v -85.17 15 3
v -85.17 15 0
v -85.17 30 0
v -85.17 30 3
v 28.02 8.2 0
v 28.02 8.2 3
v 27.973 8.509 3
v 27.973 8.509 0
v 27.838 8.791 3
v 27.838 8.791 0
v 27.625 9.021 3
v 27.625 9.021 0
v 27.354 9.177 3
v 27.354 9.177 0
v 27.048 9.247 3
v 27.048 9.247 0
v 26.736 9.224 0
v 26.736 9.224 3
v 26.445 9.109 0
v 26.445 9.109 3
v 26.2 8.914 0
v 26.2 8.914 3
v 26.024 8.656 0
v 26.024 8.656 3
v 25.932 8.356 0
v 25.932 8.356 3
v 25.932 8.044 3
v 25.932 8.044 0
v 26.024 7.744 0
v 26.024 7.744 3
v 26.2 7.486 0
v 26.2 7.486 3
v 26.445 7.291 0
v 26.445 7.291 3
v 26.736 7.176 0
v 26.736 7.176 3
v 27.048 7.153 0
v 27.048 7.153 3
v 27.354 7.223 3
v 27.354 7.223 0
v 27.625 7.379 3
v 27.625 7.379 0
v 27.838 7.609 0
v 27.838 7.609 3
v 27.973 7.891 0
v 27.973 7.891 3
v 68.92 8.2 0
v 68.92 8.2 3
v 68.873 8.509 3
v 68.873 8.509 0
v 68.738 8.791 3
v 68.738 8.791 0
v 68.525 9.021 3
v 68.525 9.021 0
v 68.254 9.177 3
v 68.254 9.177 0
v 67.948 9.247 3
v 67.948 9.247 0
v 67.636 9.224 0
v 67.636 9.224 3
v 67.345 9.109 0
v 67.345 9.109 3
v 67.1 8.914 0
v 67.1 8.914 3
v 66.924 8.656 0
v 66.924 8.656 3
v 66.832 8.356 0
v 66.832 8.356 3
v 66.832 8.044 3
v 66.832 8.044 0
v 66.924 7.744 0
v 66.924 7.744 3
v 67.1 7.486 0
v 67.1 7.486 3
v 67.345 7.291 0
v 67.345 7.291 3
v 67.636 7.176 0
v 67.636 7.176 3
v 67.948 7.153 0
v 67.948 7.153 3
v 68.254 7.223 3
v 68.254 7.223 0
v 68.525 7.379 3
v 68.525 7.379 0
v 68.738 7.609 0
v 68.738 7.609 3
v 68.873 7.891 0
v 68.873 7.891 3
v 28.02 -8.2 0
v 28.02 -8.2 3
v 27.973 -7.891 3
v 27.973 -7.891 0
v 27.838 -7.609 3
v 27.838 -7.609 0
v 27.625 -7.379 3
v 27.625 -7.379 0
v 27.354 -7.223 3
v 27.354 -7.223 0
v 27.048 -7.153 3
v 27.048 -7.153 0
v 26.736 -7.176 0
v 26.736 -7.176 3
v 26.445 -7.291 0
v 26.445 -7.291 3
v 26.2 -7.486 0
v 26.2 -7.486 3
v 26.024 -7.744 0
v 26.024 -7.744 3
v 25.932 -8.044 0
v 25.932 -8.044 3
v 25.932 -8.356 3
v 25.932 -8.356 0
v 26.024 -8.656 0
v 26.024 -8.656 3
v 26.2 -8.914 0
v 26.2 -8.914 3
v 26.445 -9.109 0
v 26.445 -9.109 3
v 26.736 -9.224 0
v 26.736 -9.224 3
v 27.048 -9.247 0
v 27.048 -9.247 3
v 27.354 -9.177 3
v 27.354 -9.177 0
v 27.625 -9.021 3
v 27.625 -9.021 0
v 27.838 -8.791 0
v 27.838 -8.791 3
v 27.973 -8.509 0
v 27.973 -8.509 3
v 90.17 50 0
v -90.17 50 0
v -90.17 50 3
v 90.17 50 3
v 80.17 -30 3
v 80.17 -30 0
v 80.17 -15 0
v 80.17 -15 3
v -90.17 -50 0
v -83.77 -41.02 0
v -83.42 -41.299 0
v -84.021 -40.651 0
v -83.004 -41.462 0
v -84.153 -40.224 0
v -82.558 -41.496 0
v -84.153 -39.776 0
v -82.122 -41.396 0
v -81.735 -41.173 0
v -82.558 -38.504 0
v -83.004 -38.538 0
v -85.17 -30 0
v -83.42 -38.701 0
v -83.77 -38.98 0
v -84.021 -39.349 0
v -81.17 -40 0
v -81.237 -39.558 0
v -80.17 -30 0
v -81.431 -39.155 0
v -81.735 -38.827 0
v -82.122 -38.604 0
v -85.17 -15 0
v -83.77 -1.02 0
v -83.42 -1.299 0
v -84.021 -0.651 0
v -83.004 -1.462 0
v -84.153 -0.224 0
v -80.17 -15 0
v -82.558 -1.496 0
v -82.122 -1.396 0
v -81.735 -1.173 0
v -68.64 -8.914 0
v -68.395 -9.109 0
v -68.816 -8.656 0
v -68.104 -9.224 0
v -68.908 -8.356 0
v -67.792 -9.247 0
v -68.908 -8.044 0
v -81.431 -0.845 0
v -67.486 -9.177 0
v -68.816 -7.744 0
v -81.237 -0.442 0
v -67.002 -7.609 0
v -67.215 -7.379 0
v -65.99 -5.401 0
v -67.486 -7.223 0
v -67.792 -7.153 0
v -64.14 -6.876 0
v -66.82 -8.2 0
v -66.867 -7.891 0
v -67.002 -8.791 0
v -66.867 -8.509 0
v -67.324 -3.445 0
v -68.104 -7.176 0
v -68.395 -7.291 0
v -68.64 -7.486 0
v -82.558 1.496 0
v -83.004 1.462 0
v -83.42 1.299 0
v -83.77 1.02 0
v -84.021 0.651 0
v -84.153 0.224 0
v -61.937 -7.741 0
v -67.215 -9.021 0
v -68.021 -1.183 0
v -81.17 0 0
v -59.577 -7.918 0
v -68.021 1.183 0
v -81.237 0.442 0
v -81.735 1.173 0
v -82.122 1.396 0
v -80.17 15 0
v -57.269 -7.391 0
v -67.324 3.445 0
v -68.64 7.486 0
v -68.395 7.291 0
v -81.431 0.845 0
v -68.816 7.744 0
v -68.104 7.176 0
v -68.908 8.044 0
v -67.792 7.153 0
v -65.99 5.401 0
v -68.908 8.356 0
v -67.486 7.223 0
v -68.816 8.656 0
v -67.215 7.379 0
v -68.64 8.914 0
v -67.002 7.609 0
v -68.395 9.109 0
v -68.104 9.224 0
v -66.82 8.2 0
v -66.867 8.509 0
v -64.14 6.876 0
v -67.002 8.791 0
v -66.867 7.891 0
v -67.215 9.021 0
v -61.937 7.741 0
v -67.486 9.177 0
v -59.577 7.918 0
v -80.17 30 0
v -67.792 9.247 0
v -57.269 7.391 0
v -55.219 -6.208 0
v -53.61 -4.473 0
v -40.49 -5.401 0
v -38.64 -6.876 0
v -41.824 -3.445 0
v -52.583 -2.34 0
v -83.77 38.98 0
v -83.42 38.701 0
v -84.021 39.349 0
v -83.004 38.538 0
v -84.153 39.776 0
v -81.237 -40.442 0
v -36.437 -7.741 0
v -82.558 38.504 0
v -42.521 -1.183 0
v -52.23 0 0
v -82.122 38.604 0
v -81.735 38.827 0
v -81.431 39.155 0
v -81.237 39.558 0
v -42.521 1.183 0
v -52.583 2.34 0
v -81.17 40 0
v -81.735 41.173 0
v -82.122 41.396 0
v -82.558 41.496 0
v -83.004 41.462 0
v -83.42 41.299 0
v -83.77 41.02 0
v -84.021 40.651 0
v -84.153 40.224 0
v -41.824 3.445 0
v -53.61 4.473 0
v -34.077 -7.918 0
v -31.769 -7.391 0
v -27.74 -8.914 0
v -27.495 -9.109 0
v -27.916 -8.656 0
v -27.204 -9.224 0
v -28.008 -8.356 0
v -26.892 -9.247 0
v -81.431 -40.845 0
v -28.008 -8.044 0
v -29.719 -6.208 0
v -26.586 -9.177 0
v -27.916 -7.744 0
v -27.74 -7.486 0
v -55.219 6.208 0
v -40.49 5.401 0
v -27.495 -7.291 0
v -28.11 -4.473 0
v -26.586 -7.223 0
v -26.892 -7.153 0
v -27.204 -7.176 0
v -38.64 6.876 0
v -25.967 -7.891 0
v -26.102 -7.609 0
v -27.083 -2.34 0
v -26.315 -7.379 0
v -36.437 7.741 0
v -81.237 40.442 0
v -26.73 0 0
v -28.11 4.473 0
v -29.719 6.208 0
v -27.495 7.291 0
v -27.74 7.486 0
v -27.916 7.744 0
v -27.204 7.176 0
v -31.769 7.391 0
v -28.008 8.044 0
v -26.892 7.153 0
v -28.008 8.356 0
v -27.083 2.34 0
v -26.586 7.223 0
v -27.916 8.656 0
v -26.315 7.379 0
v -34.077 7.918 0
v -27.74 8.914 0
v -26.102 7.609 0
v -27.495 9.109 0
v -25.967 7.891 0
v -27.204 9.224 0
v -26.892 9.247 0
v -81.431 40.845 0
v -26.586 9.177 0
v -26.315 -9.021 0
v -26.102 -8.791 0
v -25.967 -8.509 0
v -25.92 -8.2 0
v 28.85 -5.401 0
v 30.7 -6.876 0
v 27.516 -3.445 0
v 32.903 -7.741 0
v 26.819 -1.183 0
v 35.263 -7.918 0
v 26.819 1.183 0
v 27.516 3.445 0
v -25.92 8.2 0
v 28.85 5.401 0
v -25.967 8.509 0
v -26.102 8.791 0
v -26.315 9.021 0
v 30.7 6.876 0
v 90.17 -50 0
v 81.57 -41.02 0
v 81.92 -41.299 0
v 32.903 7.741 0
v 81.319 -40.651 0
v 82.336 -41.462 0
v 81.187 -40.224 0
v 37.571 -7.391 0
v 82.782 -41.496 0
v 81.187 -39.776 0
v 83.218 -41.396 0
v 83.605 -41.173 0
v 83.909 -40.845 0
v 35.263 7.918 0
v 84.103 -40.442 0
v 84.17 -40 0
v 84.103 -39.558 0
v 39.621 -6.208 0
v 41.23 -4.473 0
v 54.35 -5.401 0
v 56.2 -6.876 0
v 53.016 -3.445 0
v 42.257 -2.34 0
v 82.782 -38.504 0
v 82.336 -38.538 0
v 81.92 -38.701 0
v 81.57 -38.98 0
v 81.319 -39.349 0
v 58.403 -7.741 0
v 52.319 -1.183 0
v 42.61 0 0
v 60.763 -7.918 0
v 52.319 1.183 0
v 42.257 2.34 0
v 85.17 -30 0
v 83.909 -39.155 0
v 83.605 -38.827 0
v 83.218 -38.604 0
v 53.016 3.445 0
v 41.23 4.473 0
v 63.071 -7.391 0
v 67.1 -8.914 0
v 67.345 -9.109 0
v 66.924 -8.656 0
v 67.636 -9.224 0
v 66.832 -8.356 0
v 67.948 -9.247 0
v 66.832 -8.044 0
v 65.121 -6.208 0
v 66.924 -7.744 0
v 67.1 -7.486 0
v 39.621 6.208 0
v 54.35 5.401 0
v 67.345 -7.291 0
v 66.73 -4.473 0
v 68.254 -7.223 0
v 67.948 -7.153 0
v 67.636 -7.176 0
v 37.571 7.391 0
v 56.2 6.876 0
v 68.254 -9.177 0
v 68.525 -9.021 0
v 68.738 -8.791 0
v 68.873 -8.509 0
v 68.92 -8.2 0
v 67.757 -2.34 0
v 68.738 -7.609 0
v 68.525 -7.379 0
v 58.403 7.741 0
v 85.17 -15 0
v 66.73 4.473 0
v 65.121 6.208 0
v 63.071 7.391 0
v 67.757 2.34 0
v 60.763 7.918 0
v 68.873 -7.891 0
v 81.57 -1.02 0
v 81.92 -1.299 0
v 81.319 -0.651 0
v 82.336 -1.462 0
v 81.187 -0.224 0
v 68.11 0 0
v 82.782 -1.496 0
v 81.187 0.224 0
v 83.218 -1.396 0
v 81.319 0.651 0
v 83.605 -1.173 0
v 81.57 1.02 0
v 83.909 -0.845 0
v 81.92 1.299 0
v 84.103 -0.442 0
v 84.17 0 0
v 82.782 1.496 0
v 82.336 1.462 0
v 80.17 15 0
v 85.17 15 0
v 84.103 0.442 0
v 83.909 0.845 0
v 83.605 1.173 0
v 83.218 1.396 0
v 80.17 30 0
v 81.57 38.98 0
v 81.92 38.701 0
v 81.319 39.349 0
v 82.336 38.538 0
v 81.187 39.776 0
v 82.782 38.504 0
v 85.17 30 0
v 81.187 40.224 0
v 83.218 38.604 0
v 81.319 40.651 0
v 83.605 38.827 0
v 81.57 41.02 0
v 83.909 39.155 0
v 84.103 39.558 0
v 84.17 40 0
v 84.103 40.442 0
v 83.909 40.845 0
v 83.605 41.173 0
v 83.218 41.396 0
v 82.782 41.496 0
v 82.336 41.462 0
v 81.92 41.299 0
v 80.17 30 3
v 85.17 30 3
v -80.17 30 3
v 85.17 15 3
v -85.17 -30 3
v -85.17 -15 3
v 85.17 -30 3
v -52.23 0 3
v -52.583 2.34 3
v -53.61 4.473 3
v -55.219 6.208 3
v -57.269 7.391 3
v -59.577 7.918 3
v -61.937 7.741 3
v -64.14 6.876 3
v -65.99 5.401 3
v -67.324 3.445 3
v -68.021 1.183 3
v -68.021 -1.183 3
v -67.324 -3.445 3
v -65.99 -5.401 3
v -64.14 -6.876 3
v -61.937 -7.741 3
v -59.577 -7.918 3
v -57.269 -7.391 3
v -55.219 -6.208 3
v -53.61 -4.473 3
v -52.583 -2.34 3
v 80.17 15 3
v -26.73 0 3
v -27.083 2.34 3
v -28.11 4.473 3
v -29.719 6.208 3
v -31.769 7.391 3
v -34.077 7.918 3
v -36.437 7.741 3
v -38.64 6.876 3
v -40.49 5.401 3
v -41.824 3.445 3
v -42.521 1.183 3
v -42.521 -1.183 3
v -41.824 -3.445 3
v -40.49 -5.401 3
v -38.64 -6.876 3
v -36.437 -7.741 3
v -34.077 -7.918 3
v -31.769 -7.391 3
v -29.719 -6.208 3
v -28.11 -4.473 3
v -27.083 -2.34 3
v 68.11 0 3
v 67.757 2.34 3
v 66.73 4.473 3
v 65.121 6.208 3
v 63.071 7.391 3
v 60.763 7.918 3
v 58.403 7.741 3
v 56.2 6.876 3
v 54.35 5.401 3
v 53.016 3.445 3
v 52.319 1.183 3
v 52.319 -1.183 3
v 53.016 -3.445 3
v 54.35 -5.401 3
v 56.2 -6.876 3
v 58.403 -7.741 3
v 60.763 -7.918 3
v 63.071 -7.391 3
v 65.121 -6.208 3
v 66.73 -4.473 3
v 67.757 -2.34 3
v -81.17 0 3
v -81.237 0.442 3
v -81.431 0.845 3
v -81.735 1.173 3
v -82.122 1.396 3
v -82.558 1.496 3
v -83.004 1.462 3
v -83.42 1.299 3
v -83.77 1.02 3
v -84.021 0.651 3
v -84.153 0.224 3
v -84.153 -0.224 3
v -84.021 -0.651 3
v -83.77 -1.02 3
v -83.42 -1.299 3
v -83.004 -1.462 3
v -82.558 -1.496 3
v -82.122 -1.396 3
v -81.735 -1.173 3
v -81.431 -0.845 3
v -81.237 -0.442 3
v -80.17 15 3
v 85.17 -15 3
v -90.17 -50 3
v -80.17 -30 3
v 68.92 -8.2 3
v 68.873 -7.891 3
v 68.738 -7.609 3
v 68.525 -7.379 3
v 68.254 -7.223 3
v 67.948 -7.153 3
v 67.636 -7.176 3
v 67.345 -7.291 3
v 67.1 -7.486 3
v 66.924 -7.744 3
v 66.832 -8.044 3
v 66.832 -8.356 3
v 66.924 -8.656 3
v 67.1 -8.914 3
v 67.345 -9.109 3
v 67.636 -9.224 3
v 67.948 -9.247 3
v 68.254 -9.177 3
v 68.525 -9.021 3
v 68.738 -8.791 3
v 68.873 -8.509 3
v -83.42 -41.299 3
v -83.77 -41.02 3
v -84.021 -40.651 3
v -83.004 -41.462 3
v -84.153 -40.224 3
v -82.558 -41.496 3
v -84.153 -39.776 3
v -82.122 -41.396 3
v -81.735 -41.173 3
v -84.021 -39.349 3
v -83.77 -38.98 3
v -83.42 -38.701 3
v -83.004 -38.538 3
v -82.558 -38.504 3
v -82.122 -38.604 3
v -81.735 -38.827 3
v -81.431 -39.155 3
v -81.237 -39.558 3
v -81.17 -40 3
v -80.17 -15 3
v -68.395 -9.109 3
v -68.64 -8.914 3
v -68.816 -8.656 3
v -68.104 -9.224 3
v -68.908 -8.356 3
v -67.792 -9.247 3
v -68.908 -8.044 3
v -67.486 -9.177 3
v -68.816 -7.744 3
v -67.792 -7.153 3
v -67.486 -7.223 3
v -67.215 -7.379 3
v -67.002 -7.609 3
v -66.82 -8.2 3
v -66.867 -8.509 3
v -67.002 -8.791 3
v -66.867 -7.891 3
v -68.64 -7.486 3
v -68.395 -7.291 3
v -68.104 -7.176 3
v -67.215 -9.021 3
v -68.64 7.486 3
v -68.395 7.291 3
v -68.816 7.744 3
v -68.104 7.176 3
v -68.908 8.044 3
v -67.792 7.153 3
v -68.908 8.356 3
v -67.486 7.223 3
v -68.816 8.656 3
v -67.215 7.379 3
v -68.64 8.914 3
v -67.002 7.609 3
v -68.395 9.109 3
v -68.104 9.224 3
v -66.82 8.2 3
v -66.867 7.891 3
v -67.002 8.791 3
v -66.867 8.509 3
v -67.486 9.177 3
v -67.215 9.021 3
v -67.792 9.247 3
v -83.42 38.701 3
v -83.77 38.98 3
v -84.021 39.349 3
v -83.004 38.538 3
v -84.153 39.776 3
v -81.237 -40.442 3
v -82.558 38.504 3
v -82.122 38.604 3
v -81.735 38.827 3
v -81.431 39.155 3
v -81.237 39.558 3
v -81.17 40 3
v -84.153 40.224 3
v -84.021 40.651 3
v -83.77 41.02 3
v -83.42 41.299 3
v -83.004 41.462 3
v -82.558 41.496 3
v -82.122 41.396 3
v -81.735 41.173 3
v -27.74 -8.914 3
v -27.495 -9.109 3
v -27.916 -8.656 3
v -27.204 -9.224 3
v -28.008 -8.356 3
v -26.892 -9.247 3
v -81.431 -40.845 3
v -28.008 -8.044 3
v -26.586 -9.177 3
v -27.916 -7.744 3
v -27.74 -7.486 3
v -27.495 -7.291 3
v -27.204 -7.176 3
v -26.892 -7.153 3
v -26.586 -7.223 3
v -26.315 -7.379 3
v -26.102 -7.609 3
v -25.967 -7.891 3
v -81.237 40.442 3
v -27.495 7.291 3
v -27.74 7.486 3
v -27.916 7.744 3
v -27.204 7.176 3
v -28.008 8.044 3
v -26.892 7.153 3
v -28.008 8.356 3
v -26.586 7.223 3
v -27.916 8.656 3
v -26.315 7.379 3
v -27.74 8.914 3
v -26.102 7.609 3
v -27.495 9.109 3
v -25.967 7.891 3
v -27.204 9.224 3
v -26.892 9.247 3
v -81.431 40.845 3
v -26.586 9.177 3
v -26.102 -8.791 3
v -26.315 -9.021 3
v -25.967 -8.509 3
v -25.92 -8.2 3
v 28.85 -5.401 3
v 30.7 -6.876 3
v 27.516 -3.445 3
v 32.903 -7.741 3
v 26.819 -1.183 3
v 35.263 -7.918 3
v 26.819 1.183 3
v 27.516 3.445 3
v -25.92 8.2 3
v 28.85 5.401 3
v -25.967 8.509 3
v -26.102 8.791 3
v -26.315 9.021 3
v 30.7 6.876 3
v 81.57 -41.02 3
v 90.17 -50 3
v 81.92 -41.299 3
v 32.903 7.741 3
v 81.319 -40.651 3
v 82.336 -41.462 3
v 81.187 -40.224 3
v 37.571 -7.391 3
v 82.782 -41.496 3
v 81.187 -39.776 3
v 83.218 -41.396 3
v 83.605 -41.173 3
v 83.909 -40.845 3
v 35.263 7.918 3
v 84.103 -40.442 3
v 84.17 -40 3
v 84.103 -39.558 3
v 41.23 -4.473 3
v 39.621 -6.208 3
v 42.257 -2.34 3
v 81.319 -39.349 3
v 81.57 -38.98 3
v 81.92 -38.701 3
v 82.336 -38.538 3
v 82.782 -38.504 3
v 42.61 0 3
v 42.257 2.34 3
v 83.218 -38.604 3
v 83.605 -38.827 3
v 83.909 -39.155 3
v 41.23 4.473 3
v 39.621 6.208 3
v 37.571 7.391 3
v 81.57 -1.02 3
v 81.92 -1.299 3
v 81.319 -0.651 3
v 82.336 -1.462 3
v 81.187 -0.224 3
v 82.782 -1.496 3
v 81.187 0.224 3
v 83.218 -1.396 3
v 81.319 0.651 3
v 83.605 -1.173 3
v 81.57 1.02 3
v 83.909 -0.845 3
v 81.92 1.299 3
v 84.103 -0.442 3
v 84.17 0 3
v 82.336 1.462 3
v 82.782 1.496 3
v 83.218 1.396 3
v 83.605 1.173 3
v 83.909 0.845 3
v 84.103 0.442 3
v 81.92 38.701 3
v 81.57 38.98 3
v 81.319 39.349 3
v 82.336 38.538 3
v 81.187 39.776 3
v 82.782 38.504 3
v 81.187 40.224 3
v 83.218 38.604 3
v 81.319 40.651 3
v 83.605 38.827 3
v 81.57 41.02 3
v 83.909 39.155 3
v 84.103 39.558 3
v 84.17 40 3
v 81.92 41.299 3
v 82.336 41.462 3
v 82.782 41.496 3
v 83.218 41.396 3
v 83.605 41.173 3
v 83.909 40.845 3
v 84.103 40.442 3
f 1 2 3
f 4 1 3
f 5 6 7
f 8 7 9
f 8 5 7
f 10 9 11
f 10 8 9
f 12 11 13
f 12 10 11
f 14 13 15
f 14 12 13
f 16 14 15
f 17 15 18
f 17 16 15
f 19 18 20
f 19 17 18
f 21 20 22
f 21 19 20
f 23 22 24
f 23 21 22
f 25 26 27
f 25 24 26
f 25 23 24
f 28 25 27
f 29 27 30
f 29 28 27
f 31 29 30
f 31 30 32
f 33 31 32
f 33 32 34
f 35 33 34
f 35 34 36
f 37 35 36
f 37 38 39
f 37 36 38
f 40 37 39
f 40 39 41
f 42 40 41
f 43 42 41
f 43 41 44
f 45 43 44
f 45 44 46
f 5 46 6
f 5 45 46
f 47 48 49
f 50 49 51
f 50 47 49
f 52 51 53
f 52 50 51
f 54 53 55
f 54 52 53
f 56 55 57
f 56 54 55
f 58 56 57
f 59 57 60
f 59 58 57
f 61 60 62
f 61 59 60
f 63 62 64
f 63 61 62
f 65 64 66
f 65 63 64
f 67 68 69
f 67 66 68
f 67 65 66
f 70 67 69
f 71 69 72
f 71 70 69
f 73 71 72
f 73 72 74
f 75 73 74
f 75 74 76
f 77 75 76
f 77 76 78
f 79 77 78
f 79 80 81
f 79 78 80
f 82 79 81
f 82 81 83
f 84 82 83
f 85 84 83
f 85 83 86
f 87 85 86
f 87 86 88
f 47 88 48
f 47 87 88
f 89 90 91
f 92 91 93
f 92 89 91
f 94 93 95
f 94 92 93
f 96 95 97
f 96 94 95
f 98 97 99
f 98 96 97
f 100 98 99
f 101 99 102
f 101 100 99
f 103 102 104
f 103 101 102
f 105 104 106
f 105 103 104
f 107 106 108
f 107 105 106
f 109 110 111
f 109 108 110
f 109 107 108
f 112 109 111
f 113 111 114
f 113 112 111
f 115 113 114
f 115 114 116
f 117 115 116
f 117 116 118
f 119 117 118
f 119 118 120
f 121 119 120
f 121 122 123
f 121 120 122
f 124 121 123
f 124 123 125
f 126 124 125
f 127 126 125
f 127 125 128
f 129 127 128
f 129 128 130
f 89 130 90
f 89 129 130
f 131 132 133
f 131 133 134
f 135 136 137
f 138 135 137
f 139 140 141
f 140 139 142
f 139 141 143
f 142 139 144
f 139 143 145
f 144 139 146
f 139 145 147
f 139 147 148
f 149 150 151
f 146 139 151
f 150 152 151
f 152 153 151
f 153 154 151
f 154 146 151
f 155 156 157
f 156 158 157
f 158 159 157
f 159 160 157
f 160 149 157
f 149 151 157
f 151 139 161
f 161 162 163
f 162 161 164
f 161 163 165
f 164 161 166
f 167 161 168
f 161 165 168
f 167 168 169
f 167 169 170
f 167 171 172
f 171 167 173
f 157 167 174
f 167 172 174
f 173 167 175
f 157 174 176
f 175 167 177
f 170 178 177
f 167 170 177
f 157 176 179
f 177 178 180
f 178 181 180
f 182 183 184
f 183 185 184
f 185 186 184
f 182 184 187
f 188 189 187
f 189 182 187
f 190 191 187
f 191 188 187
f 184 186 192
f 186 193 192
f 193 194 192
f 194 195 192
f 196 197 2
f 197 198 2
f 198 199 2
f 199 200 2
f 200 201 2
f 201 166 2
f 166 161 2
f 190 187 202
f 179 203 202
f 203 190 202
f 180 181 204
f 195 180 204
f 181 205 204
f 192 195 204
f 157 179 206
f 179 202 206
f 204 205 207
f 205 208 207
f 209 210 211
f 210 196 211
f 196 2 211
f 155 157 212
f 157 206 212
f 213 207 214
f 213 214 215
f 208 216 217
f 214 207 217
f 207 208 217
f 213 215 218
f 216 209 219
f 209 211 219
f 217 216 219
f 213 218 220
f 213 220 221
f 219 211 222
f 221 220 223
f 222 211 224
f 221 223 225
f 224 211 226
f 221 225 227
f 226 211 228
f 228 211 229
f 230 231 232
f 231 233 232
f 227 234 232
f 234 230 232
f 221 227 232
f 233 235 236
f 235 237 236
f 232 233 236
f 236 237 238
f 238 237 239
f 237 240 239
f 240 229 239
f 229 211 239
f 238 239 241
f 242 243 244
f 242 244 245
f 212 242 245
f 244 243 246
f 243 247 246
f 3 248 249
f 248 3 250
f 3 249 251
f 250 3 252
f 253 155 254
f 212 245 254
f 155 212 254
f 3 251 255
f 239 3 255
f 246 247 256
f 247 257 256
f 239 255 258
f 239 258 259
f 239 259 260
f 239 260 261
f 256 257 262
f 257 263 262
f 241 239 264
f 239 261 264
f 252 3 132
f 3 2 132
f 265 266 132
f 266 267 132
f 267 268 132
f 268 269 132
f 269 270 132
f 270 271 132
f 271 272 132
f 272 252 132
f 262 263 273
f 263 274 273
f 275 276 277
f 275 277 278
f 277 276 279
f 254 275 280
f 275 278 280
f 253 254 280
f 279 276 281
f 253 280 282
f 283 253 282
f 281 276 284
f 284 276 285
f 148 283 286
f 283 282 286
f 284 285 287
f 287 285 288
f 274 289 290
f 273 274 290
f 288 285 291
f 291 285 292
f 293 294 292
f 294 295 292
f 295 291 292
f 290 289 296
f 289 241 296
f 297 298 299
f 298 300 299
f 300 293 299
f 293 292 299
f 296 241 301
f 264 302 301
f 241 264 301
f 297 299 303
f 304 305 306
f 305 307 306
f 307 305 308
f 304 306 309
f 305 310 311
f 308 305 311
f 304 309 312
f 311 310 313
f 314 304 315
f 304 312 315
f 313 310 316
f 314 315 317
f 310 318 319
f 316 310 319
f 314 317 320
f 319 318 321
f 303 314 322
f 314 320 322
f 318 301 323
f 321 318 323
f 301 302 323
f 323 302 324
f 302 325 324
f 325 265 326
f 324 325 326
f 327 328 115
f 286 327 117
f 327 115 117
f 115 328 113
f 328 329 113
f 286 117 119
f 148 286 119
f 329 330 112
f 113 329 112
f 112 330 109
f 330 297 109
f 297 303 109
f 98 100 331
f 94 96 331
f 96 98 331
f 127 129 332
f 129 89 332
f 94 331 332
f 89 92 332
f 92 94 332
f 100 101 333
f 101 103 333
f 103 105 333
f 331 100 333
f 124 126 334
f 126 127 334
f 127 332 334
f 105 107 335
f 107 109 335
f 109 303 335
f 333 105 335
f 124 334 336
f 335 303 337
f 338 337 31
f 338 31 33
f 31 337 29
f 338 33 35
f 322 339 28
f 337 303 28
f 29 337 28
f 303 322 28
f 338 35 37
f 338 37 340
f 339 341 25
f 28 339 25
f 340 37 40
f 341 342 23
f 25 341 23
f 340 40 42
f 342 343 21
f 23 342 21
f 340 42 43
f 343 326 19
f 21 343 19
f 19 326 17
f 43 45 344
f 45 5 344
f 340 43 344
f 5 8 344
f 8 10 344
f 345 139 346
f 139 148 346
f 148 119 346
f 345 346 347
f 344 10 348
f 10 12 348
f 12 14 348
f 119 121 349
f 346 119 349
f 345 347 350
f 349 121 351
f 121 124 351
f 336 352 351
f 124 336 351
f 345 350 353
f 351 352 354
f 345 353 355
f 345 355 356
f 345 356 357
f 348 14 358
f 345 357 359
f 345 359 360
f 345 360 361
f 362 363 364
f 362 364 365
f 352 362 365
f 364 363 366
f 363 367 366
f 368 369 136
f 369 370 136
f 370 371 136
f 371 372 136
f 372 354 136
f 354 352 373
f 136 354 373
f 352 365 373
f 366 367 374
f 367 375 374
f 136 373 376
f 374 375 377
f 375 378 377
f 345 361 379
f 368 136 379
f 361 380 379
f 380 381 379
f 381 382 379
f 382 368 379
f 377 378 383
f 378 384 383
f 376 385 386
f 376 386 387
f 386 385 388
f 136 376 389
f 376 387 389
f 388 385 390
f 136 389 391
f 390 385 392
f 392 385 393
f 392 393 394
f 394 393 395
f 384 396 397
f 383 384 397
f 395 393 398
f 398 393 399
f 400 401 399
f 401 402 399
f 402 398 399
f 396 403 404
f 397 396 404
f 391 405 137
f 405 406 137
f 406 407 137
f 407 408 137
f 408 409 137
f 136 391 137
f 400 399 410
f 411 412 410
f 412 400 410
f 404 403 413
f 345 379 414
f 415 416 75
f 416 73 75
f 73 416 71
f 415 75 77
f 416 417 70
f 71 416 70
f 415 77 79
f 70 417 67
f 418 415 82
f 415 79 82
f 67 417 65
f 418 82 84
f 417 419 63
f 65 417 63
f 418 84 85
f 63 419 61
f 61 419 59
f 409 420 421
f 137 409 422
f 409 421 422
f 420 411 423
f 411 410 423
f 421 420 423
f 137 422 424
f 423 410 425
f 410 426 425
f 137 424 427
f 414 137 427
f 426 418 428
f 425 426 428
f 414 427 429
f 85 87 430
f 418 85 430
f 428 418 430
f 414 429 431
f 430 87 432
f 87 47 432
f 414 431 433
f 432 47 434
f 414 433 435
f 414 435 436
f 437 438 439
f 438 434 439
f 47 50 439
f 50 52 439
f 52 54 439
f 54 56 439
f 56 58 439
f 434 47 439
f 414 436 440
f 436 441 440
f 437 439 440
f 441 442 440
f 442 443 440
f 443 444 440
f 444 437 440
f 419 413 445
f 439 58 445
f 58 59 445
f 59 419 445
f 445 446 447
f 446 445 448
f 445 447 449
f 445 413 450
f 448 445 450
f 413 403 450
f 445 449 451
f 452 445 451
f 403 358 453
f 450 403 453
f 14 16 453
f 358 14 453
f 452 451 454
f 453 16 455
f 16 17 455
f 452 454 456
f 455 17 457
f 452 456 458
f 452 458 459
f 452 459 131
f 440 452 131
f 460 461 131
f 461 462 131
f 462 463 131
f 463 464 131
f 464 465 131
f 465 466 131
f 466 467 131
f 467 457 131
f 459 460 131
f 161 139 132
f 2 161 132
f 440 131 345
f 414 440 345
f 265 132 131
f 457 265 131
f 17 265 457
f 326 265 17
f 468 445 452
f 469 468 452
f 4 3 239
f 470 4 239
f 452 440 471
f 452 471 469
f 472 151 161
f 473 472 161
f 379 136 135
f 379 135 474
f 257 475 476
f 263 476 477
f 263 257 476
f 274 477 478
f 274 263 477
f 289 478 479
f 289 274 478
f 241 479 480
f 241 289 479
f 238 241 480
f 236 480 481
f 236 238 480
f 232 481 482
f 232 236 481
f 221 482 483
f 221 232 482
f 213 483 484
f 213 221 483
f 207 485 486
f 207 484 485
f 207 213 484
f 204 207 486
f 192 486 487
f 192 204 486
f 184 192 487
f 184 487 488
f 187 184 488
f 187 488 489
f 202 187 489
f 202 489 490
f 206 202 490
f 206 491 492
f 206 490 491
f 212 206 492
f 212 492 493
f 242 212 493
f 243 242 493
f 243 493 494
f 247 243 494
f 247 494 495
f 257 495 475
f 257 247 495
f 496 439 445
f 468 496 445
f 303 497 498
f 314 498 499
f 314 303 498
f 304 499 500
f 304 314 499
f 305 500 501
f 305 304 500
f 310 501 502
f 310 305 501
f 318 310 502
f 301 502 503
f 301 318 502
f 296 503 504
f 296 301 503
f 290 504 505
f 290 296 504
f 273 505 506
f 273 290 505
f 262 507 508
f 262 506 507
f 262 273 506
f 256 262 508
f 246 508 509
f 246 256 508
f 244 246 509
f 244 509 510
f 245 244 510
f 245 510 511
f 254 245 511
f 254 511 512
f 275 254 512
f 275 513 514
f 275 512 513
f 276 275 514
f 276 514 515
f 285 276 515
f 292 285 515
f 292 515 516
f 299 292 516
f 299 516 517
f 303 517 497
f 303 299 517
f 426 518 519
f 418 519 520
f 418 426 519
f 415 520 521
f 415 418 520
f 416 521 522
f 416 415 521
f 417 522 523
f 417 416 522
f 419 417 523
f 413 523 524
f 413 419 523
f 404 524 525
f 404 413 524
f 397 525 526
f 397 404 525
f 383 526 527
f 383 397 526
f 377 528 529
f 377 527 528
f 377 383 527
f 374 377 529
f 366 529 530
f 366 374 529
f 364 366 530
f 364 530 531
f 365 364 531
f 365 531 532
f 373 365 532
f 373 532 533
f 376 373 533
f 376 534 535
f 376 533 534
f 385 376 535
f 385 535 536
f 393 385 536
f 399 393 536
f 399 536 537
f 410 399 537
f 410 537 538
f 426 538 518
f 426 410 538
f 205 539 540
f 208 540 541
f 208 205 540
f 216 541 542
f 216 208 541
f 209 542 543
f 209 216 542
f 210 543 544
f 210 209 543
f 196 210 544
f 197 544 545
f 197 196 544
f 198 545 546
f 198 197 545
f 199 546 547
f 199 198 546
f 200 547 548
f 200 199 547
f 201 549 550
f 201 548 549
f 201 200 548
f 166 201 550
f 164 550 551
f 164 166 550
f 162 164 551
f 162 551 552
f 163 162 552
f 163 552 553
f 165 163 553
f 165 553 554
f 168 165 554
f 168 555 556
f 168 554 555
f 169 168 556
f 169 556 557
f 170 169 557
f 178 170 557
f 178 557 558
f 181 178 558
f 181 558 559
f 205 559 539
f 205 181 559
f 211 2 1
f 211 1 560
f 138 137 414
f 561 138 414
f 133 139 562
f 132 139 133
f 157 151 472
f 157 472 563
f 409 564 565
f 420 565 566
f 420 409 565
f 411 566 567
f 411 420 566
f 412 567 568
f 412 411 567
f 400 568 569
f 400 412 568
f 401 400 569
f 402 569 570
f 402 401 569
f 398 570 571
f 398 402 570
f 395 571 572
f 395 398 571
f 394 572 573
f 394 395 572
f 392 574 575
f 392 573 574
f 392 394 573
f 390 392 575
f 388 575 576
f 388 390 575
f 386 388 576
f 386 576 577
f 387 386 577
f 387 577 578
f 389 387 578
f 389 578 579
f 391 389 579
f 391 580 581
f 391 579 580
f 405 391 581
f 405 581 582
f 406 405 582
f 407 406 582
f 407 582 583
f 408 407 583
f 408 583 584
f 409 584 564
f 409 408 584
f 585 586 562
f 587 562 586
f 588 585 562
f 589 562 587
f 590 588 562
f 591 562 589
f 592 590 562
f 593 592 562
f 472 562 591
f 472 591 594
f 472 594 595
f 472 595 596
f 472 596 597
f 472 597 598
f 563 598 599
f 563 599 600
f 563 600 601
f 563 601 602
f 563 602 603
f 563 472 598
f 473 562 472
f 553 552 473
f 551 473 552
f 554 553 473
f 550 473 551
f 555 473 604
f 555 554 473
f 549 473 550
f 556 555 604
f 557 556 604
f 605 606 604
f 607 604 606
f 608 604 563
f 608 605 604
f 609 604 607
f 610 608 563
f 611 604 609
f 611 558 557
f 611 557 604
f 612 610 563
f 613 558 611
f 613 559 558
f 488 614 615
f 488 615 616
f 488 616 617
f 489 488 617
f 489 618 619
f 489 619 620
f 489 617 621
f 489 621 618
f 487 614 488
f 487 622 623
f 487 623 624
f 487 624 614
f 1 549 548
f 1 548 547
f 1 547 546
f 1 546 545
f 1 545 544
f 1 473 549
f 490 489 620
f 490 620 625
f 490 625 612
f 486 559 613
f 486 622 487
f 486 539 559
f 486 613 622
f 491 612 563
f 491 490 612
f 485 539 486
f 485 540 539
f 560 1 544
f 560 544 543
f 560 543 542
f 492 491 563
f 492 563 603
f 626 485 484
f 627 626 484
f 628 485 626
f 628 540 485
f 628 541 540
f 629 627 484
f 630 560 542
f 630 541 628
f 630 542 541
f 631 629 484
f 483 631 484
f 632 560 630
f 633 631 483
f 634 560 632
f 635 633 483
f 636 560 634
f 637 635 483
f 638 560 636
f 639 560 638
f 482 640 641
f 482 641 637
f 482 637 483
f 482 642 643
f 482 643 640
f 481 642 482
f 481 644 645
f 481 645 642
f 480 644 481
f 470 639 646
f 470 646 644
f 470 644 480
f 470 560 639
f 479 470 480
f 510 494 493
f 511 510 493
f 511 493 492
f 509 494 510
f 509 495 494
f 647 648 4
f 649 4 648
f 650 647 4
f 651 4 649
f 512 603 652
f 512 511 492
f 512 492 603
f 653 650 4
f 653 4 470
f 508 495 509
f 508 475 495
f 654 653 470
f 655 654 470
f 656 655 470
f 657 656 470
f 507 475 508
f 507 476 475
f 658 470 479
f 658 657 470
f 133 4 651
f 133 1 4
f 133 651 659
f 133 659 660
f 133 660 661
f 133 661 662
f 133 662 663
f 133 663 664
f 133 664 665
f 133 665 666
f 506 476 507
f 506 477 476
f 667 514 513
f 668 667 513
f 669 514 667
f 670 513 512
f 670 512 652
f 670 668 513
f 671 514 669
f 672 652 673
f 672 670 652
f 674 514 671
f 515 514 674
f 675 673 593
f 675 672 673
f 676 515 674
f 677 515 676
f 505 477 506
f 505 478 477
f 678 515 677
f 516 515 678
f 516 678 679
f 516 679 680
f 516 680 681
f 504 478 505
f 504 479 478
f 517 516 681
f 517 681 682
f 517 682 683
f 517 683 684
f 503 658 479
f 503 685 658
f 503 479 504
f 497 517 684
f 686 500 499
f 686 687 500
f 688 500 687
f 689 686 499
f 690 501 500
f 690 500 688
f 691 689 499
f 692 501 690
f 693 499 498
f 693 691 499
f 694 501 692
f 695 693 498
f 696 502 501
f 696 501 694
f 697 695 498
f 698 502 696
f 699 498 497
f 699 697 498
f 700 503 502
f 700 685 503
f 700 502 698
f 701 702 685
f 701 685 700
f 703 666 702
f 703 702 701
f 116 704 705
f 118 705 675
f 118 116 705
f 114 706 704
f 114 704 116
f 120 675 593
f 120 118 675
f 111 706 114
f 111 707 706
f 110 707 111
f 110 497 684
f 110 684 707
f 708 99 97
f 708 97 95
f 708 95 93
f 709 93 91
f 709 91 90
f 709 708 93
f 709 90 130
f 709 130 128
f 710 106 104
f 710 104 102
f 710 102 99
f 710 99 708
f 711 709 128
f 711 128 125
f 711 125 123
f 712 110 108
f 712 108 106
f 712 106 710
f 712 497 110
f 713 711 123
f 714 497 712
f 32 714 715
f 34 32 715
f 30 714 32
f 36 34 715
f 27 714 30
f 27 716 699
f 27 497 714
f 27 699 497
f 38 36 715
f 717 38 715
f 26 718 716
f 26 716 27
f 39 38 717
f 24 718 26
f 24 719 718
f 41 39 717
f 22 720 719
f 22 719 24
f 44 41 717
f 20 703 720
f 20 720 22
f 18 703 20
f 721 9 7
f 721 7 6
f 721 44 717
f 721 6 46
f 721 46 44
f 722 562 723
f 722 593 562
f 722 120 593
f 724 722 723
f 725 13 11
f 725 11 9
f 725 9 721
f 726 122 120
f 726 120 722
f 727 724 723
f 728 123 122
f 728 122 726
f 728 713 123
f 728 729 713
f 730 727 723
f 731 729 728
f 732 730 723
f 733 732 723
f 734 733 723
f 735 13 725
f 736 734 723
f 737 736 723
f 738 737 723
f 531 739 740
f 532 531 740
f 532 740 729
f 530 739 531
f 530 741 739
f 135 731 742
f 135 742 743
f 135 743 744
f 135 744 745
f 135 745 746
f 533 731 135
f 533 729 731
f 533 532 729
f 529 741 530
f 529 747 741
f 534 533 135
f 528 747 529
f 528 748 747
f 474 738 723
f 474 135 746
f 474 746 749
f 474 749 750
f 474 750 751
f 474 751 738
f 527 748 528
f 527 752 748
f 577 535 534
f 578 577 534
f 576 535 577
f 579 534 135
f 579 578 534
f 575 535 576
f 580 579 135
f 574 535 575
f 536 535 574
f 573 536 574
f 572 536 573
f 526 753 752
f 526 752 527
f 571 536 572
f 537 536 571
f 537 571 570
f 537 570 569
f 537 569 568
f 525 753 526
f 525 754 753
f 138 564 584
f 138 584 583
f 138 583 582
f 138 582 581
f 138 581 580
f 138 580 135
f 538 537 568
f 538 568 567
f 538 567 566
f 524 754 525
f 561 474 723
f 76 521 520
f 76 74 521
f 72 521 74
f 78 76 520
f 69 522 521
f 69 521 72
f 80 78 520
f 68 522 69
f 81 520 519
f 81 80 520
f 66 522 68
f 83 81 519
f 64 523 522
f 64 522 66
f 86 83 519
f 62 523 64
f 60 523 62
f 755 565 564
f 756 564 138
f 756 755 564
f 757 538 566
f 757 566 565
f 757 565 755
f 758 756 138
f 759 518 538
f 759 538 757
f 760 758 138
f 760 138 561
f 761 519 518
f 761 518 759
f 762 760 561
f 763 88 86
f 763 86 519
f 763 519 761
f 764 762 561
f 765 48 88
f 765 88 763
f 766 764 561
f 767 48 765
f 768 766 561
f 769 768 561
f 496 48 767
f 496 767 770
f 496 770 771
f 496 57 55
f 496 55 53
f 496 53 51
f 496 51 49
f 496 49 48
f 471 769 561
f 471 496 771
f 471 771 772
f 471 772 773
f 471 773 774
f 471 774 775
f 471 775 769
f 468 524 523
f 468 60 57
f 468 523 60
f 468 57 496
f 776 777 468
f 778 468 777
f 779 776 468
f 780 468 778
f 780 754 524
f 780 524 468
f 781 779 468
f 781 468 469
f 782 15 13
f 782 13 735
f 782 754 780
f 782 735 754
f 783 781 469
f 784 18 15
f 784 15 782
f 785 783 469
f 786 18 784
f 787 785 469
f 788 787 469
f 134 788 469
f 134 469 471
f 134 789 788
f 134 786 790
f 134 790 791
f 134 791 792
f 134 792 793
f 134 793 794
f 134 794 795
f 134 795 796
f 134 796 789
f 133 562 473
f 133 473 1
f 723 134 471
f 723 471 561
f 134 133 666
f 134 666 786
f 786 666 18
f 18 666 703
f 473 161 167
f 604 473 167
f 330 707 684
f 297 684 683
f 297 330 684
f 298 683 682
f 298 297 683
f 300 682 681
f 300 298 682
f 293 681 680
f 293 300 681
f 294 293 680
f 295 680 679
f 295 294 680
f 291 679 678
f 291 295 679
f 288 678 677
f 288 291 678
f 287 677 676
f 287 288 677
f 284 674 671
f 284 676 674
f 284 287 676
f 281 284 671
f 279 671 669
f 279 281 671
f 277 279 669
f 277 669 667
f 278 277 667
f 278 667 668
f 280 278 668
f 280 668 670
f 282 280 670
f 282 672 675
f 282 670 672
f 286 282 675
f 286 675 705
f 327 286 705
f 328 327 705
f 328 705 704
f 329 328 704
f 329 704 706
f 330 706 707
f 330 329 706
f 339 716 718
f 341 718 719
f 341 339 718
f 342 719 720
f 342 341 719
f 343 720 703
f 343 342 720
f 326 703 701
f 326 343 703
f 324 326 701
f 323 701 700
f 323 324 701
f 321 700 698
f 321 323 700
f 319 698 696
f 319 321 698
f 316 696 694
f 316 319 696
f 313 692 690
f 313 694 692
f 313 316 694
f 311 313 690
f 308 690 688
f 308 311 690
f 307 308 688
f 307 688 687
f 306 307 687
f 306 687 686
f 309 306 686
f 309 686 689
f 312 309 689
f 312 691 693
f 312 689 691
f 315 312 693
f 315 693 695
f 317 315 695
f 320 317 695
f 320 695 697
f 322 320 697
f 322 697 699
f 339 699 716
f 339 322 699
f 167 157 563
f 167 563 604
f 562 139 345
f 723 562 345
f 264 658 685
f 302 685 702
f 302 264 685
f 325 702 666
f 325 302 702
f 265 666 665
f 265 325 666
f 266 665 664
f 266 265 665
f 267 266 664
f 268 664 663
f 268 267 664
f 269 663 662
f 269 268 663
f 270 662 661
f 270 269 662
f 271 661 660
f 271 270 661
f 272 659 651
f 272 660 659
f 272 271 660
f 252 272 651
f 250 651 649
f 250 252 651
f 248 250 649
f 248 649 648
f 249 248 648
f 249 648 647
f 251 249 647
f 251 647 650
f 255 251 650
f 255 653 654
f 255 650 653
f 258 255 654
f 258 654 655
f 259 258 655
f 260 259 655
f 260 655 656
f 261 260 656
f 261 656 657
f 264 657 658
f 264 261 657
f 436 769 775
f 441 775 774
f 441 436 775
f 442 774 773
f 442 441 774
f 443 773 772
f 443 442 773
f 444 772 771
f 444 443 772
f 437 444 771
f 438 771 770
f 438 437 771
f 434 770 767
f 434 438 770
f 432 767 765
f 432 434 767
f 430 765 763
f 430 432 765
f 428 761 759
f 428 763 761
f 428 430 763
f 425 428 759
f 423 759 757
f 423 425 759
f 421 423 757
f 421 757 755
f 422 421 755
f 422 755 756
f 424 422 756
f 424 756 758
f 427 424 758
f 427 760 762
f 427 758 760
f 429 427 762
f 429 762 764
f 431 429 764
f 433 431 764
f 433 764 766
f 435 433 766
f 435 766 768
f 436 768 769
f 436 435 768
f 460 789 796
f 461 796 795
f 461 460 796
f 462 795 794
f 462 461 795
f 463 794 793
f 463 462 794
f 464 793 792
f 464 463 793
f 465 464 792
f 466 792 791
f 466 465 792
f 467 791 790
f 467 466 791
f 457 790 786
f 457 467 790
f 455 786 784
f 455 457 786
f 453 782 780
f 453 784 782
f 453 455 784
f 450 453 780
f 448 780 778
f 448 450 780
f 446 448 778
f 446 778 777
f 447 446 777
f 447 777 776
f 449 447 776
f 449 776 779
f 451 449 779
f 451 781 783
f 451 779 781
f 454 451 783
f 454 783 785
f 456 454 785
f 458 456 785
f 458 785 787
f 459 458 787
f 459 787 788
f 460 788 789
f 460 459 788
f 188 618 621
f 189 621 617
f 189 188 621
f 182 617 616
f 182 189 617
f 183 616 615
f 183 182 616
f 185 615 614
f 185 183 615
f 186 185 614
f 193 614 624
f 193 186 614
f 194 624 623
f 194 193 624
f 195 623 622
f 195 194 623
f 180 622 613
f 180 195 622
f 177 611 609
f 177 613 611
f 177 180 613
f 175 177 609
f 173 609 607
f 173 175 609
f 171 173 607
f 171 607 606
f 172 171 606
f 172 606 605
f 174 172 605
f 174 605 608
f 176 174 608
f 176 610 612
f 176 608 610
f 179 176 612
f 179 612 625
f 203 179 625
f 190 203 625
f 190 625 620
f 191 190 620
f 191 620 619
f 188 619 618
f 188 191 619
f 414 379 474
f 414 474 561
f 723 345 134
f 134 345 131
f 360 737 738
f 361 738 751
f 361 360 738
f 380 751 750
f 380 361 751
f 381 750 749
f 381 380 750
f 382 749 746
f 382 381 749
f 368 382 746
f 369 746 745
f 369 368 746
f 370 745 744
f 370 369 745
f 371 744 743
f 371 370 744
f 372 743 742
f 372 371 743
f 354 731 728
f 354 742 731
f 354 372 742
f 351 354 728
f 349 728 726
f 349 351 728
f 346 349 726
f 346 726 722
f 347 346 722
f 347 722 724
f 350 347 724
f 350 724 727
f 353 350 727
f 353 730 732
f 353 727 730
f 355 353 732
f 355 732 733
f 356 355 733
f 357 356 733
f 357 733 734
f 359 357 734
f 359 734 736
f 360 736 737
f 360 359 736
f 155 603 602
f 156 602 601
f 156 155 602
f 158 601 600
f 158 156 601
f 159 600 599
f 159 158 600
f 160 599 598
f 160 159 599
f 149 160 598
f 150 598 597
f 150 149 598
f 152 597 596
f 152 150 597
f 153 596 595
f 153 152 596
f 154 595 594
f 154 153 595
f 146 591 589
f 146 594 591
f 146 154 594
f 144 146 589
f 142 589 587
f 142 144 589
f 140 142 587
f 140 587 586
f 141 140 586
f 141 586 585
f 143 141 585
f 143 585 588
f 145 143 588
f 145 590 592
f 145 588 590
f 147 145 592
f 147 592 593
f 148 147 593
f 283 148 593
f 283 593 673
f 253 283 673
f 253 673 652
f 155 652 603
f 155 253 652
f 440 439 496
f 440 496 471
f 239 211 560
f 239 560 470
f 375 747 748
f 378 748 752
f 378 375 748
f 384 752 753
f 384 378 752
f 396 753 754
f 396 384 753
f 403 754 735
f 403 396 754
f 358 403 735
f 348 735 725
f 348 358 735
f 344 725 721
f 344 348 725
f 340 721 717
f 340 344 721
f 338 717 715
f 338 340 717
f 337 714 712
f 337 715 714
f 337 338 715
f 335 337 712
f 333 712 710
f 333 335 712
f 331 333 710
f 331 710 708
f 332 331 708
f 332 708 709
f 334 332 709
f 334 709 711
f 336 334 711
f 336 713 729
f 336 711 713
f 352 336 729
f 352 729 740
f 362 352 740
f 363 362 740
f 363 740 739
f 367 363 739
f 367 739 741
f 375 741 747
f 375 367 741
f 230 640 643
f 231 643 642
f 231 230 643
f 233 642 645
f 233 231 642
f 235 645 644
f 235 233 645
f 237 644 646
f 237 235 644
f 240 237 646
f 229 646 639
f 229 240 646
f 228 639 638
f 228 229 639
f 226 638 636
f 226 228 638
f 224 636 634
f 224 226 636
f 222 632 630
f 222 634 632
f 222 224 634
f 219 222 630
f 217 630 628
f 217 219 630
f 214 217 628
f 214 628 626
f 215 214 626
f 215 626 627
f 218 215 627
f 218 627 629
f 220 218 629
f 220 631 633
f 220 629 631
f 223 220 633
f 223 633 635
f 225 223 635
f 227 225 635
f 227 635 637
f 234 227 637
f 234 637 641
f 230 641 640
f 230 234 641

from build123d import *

# Parameters (mm, degrees)
SCHIZZO1_W                   = 180.34
SCHIZZO1_H                   = 100
ESTRUSIONE_ESTRUSIONE1_DEPTH = 3
SCHIZZO2_R                   = 1.5
SCHIZZO2_W                   = 5
SCHIZZO2_H                   = 15
TAGLIO_ESTRUSIONE1_DEPTH     = 4
SCHIZZO3_R                   = 7.94
SCHIZZO3_R_2                 = 1.05
TAGLIO_ESTRUSIONE2_DEPTH     = 4


with BuildPart() as part:
    # Schizzo1 → Estrusione-Estrusione1 (new body)
    with BuildSketch(Plane.XY):
        Rectangle(SCHIZZO1_W, SCHIZZO1_H)
    extrude(amount=ESTRUSIONE_ESTRUSIONE1_DEPTH)

    # Schizzo2 → Taglio-Estrusione1 (cut, through all)
    with BuildSketch(Plane.XY):
        with Locations((-82.67, 0)):
            Circle(SCHIZZO2_R)
        with Locations((82.67, 0)):
            Circle(SCHIZZO2_R)
        with Locations((-82.67, 40)):
            Circle(SCHIZZO2_R)
        with Locations((-82.67, -40)):
            Circle(SCHIZZO2_R)
        with Locations((82.67, -40)):
            Circle(SCHIZZO2_R)
        with Locations((82.67, 40)):
            Circle(SCHIZZO2_R)
        with Locations((-82.67, 22.5)):
            Rectangle(SCHIZZO2_W, SCHIZZO2_H)
        with Locations((-82.67, -22.5)):
            Rectangle(SCHIZZO2_W, SCHIZZO2_H)
        with Locations((82.67, 22.5)):
            Rectangle(SCHIZZO2_W, SCHIZZO2_H)
        with Locations((82.67, -22.5)):
            Rectangle(SCHIZZO2_W, SCHIZZO2_H)
    extrude(amount=TAGLIO_ESTRUSIONE1_DEPTH, mode=Mode.SUBTRACT)

    # Schizzo3 → Taglio-Estrusione2 (cut, through all)
    with BuildSketch(Plane.XY):
        with Locations((-60.17, 0)):
            Circle(SCHIZZO3_R)
        with Locations((-34.67, 0)):
            Circle(SCHIZZO3_R)
        with Locations((60.17, 0)):
            Circle(SCHIZZO3_R)
        with Locations((34.67, 0)):
            Circle(SCHIZZO3_R)
        with Locations((-26.97, -8.2)):
            Circle(SCHIZZO3_R_2)
        with Locations((-26.97, 8.2)):
            Circle(SCHIZZO3_R_2)
        with Locations((-67.87, -8.2)):
            Circle(SCHIZZO3_R_2)
        with Locations((-67.87, 8.2)):
            Circle(SCHIZZO3_R_2)
        with Locations((26.97, 8.2)):
            Circle(SCHIZZO3_R_2)
        with Locations((26.97, -8.2)):
            Circle(SCHIZZO3_R_2)
        with Locations((67.87, -8.2)):
            Circle(SCHIZZO3_R_2)
        with Locations((67.87, 8.2)):
            Circle(SCHIZZO3_R_2)
    extrude(amount=TAGLIO_ESTRUSIONE2_DEPTH, mode=Mode.SUBTRACT)


solid = part.part
